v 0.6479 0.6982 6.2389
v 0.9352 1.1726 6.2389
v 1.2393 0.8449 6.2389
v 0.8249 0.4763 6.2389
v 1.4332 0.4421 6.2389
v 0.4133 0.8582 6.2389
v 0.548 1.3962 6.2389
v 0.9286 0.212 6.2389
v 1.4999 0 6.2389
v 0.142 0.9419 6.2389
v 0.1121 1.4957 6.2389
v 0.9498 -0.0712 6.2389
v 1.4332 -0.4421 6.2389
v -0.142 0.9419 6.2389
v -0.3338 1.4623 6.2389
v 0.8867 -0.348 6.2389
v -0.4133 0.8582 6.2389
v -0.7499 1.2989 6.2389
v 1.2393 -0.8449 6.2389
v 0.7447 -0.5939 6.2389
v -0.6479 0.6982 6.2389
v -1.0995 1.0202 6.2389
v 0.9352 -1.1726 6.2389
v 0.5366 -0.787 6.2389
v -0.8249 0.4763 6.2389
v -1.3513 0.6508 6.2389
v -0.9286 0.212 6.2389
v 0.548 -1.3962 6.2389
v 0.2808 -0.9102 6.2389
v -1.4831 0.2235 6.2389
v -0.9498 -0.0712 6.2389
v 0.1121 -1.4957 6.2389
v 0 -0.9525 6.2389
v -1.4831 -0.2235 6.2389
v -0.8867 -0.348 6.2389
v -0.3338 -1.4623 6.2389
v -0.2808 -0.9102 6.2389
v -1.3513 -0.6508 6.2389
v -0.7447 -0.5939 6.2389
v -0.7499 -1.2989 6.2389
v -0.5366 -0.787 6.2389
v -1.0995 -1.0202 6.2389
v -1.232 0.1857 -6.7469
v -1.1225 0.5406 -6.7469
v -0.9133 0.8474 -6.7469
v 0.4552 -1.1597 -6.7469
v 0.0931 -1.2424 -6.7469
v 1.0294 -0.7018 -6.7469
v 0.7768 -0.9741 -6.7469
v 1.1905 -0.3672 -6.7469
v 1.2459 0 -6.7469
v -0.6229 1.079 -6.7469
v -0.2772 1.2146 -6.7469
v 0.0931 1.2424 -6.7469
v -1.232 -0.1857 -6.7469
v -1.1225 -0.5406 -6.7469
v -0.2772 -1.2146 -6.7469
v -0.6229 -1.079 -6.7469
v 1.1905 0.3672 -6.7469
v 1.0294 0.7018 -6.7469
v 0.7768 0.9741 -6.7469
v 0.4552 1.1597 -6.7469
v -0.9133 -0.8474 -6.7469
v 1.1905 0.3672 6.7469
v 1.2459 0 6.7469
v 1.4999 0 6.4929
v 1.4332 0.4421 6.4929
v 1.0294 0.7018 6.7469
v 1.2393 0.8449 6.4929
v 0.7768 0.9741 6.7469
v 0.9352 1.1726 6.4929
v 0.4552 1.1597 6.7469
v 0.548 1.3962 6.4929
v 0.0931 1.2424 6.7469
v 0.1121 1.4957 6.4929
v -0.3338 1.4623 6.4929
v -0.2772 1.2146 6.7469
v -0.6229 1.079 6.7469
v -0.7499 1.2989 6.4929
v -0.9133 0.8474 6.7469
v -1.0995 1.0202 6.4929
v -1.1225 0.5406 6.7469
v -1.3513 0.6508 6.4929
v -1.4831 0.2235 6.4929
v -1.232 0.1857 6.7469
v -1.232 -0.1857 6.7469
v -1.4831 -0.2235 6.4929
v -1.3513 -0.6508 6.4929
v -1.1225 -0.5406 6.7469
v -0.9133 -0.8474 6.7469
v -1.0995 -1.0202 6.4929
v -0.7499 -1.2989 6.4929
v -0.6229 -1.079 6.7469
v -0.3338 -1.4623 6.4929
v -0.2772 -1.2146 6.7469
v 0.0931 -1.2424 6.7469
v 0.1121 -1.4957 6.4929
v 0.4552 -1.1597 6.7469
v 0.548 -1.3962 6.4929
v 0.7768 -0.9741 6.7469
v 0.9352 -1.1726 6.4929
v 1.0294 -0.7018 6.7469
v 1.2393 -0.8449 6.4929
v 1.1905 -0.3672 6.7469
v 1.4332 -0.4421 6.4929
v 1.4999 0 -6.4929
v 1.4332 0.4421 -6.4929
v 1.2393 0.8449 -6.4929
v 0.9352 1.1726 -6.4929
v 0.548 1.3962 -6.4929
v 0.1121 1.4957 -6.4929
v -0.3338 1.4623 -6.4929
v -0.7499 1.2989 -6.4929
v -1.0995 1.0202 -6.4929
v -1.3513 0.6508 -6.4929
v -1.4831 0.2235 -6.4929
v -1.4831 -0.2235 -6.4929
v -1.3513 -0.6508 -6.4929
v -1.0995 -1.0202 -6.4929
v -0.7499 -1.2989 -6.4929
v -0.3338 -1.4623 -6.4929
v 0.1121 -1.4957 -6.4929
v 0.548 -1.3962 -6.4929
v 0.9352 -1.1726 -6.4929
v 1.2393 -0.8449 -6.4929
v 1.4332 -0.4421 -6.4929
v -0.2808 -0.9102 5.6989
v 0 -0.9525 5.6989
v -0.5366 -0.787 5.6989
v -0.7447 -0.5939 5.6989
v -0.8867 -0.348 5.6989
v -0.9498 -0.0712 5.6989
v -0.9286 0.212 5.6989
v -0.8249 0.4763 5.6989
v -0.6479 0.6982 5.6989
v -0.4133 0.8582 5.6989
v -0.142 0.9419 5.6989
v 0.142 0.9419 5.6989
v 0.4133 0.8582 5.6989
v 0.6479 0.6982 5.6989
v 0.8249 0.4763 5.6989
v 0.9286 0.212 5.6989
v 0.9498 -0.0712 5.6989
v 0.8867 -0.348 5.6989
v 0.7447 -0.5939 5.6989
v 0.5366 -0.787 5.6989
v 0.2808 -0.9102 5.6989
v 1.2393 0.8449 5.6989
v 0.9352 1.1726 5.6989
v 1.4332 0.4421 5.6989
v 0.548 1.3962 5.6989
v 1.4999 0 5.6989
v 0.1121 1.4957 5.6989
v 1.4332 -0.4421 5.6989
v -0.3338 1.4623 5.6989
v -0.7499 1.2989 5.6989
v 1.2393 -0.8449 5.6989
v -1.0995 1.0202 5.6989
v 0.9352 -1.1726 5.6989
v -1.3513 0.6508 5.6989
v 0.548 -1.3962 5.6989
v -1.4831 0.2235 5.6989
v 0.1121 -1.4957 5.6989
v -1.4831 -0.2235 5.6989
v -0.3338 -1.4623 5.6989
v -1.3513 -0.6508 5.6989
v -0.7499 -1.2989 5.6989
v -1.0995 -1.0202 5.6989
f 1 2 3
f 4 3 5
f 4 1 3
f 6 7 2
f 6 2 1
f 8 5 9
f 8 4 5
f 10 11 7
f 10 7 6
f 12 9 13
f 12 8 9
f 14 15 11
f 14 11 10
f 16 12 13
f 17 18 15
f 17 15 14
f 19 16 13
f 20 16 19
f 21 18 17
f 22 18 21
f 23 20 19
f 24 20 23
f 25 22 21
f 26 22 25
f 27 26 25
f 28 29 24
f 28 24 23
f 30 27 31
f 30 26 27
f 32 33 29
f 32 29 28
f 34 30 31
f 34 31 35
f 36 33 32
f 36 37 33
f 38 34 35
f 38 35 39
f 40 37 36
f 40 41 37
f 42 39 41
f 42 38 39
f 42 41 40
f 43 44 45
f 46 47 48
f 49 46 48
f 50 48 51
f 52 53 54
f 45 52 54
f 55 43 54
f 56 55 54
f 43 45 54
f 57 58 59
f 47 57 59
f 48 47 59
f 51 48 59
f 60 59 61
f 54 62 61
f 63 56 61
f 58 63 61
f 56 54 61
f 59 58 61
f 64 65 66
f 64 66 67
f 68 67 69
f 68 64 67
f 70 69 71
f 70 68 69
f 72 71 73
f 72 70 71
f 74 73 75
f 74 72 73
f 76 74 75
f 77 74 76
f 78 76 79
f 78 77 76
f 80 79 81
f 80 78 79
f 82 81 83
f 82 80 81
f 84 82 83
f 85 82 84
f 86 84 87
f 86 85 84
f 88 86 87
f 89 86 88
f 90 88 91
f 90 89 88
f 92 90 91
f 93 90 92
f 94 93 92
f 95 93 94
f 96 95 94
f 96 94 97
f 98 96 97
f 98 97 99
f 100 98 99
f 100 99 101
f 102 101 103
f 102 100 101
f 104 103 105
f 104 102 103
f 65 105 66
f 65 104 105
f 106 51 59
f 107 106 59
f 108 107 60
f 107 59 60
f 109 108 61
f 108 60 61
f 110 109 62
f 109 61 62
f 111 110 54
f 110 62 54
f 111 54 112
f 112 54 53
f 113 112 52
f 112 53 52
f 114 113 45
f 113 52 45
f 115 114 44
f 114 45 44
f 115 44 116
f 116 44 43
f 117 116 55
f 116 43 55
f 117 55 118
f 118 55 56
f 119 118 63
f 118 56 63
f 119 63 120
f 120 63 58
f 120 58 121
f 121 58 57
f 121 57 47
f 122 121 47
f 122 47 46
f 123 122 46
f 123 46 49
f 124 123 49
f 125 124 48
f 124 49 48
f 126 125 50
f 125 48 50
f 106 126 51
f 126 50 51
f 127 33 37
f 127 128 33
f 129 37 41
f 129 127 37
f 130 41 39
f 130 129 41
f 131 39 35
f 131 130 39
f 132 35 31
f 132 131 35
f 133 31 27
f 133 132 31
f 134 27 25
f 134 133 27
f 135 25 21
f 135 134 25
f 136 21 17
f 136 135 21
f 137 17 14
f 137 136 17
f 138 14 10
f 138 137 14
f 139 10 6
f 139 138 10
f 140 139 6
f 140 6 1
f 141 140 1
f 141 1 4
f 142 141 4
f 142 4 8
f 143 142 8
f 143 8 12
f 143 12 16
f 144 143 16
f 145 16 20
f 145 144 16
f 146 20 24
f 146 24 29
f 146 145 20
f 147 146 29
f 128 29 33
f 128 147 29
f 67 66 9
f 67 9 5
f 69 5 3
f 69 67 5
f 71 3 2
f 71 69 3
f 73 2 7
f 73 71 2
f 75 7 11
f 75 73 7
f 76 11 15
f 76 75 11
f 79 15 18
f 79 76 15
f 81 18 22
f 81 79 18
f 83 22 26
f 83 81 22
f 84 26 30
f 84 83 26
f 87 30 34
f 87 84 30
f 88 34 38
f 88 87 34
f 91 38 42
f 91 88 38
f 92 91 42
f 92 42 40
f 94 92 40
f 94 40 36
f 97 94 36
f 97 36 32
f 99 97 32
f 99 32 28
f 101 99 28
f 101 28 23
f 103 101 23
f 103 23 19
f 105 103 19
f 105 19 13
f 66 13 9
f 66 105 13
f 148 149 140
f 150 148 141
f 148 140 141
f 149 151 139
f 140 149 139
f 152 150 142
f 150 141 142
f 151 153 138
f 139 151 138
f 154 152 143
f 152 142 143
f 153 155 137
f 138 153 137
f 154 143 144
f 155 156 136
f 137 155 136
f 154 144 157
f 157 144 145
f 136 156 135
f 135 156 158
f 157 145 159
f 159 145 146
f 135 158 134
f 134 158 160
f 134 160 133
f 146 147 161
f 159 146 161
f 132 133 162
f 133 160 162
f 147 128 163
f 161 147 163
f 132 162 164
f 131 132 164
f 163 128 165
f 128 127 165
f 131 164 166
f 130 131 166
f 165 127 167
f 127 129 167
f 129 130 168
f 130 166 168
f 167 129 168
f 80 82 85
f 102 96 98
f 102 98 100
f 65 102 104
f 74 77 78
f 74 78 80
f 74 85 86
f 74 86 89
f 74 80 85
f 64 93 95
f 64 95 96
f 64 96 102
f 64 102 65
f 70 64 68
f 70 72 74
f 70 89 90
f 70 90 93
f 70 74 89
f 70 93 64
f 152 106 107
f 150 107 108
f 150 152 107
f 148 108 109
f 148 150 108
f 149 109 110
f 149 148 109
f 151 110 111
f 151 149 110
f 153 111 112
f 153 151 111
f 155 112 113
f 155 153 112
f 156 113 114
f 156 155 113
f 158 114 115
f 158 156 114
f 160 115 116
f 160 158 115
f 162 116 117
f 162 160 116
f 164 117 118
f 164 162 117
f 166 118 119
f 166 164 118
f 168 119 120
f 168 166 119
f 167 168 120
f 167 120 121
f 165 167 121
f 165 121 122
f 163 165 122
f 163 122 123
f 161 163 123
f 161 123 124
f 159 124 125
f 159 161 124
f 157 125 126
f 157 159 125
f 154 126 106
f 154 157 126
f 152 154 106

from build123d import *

# Parameters (mm, degrees)
SKETCH1_R           = 1.49987
BOSS_EXTRUDE1_DEPTH = 6.746875
SKETCH2_W           = 0.54
SKETCH2_H           = 0.54737
CHAMFER1_SIZE       = 0.254


with BuildPart() as part:
    # Sketch1 → Boss-Extrude1 (new body, symmetric)
    with BuildSketch(Plane.XY):
        Circle(SKETCH1_R)
    extrude(amount=BOSS_EXTRUDE1_DEPTH, both=True)

    # Sketch2 → Cut-Revolve1 (revolve, cut)
    with BuildSketch(Plane(origin=(0, 0, 0), x_dir=(0, 0, -1), z_dir=(1, 0, 0))):
        with Locations((-5.968875, -1.226185)):
            Rectangle(SKETCH2_W, SKETCH2_H)
    revolve(axis=Axis((0, 0, 8.828032455), (0, 0, -1)), mode=Mode.SUBTRACT)

    # Chamfer1
    chamfer1_edges = [part.edges().sort_by_distance(p)[0] for p in [
        (-1.49987, 0, -6.746875),
        (-1.49987, 0, 6.746875),
    ]]
    chamfer(chamfer1_edges, length=CHAMFER1_SIZE)


solid = part.part
